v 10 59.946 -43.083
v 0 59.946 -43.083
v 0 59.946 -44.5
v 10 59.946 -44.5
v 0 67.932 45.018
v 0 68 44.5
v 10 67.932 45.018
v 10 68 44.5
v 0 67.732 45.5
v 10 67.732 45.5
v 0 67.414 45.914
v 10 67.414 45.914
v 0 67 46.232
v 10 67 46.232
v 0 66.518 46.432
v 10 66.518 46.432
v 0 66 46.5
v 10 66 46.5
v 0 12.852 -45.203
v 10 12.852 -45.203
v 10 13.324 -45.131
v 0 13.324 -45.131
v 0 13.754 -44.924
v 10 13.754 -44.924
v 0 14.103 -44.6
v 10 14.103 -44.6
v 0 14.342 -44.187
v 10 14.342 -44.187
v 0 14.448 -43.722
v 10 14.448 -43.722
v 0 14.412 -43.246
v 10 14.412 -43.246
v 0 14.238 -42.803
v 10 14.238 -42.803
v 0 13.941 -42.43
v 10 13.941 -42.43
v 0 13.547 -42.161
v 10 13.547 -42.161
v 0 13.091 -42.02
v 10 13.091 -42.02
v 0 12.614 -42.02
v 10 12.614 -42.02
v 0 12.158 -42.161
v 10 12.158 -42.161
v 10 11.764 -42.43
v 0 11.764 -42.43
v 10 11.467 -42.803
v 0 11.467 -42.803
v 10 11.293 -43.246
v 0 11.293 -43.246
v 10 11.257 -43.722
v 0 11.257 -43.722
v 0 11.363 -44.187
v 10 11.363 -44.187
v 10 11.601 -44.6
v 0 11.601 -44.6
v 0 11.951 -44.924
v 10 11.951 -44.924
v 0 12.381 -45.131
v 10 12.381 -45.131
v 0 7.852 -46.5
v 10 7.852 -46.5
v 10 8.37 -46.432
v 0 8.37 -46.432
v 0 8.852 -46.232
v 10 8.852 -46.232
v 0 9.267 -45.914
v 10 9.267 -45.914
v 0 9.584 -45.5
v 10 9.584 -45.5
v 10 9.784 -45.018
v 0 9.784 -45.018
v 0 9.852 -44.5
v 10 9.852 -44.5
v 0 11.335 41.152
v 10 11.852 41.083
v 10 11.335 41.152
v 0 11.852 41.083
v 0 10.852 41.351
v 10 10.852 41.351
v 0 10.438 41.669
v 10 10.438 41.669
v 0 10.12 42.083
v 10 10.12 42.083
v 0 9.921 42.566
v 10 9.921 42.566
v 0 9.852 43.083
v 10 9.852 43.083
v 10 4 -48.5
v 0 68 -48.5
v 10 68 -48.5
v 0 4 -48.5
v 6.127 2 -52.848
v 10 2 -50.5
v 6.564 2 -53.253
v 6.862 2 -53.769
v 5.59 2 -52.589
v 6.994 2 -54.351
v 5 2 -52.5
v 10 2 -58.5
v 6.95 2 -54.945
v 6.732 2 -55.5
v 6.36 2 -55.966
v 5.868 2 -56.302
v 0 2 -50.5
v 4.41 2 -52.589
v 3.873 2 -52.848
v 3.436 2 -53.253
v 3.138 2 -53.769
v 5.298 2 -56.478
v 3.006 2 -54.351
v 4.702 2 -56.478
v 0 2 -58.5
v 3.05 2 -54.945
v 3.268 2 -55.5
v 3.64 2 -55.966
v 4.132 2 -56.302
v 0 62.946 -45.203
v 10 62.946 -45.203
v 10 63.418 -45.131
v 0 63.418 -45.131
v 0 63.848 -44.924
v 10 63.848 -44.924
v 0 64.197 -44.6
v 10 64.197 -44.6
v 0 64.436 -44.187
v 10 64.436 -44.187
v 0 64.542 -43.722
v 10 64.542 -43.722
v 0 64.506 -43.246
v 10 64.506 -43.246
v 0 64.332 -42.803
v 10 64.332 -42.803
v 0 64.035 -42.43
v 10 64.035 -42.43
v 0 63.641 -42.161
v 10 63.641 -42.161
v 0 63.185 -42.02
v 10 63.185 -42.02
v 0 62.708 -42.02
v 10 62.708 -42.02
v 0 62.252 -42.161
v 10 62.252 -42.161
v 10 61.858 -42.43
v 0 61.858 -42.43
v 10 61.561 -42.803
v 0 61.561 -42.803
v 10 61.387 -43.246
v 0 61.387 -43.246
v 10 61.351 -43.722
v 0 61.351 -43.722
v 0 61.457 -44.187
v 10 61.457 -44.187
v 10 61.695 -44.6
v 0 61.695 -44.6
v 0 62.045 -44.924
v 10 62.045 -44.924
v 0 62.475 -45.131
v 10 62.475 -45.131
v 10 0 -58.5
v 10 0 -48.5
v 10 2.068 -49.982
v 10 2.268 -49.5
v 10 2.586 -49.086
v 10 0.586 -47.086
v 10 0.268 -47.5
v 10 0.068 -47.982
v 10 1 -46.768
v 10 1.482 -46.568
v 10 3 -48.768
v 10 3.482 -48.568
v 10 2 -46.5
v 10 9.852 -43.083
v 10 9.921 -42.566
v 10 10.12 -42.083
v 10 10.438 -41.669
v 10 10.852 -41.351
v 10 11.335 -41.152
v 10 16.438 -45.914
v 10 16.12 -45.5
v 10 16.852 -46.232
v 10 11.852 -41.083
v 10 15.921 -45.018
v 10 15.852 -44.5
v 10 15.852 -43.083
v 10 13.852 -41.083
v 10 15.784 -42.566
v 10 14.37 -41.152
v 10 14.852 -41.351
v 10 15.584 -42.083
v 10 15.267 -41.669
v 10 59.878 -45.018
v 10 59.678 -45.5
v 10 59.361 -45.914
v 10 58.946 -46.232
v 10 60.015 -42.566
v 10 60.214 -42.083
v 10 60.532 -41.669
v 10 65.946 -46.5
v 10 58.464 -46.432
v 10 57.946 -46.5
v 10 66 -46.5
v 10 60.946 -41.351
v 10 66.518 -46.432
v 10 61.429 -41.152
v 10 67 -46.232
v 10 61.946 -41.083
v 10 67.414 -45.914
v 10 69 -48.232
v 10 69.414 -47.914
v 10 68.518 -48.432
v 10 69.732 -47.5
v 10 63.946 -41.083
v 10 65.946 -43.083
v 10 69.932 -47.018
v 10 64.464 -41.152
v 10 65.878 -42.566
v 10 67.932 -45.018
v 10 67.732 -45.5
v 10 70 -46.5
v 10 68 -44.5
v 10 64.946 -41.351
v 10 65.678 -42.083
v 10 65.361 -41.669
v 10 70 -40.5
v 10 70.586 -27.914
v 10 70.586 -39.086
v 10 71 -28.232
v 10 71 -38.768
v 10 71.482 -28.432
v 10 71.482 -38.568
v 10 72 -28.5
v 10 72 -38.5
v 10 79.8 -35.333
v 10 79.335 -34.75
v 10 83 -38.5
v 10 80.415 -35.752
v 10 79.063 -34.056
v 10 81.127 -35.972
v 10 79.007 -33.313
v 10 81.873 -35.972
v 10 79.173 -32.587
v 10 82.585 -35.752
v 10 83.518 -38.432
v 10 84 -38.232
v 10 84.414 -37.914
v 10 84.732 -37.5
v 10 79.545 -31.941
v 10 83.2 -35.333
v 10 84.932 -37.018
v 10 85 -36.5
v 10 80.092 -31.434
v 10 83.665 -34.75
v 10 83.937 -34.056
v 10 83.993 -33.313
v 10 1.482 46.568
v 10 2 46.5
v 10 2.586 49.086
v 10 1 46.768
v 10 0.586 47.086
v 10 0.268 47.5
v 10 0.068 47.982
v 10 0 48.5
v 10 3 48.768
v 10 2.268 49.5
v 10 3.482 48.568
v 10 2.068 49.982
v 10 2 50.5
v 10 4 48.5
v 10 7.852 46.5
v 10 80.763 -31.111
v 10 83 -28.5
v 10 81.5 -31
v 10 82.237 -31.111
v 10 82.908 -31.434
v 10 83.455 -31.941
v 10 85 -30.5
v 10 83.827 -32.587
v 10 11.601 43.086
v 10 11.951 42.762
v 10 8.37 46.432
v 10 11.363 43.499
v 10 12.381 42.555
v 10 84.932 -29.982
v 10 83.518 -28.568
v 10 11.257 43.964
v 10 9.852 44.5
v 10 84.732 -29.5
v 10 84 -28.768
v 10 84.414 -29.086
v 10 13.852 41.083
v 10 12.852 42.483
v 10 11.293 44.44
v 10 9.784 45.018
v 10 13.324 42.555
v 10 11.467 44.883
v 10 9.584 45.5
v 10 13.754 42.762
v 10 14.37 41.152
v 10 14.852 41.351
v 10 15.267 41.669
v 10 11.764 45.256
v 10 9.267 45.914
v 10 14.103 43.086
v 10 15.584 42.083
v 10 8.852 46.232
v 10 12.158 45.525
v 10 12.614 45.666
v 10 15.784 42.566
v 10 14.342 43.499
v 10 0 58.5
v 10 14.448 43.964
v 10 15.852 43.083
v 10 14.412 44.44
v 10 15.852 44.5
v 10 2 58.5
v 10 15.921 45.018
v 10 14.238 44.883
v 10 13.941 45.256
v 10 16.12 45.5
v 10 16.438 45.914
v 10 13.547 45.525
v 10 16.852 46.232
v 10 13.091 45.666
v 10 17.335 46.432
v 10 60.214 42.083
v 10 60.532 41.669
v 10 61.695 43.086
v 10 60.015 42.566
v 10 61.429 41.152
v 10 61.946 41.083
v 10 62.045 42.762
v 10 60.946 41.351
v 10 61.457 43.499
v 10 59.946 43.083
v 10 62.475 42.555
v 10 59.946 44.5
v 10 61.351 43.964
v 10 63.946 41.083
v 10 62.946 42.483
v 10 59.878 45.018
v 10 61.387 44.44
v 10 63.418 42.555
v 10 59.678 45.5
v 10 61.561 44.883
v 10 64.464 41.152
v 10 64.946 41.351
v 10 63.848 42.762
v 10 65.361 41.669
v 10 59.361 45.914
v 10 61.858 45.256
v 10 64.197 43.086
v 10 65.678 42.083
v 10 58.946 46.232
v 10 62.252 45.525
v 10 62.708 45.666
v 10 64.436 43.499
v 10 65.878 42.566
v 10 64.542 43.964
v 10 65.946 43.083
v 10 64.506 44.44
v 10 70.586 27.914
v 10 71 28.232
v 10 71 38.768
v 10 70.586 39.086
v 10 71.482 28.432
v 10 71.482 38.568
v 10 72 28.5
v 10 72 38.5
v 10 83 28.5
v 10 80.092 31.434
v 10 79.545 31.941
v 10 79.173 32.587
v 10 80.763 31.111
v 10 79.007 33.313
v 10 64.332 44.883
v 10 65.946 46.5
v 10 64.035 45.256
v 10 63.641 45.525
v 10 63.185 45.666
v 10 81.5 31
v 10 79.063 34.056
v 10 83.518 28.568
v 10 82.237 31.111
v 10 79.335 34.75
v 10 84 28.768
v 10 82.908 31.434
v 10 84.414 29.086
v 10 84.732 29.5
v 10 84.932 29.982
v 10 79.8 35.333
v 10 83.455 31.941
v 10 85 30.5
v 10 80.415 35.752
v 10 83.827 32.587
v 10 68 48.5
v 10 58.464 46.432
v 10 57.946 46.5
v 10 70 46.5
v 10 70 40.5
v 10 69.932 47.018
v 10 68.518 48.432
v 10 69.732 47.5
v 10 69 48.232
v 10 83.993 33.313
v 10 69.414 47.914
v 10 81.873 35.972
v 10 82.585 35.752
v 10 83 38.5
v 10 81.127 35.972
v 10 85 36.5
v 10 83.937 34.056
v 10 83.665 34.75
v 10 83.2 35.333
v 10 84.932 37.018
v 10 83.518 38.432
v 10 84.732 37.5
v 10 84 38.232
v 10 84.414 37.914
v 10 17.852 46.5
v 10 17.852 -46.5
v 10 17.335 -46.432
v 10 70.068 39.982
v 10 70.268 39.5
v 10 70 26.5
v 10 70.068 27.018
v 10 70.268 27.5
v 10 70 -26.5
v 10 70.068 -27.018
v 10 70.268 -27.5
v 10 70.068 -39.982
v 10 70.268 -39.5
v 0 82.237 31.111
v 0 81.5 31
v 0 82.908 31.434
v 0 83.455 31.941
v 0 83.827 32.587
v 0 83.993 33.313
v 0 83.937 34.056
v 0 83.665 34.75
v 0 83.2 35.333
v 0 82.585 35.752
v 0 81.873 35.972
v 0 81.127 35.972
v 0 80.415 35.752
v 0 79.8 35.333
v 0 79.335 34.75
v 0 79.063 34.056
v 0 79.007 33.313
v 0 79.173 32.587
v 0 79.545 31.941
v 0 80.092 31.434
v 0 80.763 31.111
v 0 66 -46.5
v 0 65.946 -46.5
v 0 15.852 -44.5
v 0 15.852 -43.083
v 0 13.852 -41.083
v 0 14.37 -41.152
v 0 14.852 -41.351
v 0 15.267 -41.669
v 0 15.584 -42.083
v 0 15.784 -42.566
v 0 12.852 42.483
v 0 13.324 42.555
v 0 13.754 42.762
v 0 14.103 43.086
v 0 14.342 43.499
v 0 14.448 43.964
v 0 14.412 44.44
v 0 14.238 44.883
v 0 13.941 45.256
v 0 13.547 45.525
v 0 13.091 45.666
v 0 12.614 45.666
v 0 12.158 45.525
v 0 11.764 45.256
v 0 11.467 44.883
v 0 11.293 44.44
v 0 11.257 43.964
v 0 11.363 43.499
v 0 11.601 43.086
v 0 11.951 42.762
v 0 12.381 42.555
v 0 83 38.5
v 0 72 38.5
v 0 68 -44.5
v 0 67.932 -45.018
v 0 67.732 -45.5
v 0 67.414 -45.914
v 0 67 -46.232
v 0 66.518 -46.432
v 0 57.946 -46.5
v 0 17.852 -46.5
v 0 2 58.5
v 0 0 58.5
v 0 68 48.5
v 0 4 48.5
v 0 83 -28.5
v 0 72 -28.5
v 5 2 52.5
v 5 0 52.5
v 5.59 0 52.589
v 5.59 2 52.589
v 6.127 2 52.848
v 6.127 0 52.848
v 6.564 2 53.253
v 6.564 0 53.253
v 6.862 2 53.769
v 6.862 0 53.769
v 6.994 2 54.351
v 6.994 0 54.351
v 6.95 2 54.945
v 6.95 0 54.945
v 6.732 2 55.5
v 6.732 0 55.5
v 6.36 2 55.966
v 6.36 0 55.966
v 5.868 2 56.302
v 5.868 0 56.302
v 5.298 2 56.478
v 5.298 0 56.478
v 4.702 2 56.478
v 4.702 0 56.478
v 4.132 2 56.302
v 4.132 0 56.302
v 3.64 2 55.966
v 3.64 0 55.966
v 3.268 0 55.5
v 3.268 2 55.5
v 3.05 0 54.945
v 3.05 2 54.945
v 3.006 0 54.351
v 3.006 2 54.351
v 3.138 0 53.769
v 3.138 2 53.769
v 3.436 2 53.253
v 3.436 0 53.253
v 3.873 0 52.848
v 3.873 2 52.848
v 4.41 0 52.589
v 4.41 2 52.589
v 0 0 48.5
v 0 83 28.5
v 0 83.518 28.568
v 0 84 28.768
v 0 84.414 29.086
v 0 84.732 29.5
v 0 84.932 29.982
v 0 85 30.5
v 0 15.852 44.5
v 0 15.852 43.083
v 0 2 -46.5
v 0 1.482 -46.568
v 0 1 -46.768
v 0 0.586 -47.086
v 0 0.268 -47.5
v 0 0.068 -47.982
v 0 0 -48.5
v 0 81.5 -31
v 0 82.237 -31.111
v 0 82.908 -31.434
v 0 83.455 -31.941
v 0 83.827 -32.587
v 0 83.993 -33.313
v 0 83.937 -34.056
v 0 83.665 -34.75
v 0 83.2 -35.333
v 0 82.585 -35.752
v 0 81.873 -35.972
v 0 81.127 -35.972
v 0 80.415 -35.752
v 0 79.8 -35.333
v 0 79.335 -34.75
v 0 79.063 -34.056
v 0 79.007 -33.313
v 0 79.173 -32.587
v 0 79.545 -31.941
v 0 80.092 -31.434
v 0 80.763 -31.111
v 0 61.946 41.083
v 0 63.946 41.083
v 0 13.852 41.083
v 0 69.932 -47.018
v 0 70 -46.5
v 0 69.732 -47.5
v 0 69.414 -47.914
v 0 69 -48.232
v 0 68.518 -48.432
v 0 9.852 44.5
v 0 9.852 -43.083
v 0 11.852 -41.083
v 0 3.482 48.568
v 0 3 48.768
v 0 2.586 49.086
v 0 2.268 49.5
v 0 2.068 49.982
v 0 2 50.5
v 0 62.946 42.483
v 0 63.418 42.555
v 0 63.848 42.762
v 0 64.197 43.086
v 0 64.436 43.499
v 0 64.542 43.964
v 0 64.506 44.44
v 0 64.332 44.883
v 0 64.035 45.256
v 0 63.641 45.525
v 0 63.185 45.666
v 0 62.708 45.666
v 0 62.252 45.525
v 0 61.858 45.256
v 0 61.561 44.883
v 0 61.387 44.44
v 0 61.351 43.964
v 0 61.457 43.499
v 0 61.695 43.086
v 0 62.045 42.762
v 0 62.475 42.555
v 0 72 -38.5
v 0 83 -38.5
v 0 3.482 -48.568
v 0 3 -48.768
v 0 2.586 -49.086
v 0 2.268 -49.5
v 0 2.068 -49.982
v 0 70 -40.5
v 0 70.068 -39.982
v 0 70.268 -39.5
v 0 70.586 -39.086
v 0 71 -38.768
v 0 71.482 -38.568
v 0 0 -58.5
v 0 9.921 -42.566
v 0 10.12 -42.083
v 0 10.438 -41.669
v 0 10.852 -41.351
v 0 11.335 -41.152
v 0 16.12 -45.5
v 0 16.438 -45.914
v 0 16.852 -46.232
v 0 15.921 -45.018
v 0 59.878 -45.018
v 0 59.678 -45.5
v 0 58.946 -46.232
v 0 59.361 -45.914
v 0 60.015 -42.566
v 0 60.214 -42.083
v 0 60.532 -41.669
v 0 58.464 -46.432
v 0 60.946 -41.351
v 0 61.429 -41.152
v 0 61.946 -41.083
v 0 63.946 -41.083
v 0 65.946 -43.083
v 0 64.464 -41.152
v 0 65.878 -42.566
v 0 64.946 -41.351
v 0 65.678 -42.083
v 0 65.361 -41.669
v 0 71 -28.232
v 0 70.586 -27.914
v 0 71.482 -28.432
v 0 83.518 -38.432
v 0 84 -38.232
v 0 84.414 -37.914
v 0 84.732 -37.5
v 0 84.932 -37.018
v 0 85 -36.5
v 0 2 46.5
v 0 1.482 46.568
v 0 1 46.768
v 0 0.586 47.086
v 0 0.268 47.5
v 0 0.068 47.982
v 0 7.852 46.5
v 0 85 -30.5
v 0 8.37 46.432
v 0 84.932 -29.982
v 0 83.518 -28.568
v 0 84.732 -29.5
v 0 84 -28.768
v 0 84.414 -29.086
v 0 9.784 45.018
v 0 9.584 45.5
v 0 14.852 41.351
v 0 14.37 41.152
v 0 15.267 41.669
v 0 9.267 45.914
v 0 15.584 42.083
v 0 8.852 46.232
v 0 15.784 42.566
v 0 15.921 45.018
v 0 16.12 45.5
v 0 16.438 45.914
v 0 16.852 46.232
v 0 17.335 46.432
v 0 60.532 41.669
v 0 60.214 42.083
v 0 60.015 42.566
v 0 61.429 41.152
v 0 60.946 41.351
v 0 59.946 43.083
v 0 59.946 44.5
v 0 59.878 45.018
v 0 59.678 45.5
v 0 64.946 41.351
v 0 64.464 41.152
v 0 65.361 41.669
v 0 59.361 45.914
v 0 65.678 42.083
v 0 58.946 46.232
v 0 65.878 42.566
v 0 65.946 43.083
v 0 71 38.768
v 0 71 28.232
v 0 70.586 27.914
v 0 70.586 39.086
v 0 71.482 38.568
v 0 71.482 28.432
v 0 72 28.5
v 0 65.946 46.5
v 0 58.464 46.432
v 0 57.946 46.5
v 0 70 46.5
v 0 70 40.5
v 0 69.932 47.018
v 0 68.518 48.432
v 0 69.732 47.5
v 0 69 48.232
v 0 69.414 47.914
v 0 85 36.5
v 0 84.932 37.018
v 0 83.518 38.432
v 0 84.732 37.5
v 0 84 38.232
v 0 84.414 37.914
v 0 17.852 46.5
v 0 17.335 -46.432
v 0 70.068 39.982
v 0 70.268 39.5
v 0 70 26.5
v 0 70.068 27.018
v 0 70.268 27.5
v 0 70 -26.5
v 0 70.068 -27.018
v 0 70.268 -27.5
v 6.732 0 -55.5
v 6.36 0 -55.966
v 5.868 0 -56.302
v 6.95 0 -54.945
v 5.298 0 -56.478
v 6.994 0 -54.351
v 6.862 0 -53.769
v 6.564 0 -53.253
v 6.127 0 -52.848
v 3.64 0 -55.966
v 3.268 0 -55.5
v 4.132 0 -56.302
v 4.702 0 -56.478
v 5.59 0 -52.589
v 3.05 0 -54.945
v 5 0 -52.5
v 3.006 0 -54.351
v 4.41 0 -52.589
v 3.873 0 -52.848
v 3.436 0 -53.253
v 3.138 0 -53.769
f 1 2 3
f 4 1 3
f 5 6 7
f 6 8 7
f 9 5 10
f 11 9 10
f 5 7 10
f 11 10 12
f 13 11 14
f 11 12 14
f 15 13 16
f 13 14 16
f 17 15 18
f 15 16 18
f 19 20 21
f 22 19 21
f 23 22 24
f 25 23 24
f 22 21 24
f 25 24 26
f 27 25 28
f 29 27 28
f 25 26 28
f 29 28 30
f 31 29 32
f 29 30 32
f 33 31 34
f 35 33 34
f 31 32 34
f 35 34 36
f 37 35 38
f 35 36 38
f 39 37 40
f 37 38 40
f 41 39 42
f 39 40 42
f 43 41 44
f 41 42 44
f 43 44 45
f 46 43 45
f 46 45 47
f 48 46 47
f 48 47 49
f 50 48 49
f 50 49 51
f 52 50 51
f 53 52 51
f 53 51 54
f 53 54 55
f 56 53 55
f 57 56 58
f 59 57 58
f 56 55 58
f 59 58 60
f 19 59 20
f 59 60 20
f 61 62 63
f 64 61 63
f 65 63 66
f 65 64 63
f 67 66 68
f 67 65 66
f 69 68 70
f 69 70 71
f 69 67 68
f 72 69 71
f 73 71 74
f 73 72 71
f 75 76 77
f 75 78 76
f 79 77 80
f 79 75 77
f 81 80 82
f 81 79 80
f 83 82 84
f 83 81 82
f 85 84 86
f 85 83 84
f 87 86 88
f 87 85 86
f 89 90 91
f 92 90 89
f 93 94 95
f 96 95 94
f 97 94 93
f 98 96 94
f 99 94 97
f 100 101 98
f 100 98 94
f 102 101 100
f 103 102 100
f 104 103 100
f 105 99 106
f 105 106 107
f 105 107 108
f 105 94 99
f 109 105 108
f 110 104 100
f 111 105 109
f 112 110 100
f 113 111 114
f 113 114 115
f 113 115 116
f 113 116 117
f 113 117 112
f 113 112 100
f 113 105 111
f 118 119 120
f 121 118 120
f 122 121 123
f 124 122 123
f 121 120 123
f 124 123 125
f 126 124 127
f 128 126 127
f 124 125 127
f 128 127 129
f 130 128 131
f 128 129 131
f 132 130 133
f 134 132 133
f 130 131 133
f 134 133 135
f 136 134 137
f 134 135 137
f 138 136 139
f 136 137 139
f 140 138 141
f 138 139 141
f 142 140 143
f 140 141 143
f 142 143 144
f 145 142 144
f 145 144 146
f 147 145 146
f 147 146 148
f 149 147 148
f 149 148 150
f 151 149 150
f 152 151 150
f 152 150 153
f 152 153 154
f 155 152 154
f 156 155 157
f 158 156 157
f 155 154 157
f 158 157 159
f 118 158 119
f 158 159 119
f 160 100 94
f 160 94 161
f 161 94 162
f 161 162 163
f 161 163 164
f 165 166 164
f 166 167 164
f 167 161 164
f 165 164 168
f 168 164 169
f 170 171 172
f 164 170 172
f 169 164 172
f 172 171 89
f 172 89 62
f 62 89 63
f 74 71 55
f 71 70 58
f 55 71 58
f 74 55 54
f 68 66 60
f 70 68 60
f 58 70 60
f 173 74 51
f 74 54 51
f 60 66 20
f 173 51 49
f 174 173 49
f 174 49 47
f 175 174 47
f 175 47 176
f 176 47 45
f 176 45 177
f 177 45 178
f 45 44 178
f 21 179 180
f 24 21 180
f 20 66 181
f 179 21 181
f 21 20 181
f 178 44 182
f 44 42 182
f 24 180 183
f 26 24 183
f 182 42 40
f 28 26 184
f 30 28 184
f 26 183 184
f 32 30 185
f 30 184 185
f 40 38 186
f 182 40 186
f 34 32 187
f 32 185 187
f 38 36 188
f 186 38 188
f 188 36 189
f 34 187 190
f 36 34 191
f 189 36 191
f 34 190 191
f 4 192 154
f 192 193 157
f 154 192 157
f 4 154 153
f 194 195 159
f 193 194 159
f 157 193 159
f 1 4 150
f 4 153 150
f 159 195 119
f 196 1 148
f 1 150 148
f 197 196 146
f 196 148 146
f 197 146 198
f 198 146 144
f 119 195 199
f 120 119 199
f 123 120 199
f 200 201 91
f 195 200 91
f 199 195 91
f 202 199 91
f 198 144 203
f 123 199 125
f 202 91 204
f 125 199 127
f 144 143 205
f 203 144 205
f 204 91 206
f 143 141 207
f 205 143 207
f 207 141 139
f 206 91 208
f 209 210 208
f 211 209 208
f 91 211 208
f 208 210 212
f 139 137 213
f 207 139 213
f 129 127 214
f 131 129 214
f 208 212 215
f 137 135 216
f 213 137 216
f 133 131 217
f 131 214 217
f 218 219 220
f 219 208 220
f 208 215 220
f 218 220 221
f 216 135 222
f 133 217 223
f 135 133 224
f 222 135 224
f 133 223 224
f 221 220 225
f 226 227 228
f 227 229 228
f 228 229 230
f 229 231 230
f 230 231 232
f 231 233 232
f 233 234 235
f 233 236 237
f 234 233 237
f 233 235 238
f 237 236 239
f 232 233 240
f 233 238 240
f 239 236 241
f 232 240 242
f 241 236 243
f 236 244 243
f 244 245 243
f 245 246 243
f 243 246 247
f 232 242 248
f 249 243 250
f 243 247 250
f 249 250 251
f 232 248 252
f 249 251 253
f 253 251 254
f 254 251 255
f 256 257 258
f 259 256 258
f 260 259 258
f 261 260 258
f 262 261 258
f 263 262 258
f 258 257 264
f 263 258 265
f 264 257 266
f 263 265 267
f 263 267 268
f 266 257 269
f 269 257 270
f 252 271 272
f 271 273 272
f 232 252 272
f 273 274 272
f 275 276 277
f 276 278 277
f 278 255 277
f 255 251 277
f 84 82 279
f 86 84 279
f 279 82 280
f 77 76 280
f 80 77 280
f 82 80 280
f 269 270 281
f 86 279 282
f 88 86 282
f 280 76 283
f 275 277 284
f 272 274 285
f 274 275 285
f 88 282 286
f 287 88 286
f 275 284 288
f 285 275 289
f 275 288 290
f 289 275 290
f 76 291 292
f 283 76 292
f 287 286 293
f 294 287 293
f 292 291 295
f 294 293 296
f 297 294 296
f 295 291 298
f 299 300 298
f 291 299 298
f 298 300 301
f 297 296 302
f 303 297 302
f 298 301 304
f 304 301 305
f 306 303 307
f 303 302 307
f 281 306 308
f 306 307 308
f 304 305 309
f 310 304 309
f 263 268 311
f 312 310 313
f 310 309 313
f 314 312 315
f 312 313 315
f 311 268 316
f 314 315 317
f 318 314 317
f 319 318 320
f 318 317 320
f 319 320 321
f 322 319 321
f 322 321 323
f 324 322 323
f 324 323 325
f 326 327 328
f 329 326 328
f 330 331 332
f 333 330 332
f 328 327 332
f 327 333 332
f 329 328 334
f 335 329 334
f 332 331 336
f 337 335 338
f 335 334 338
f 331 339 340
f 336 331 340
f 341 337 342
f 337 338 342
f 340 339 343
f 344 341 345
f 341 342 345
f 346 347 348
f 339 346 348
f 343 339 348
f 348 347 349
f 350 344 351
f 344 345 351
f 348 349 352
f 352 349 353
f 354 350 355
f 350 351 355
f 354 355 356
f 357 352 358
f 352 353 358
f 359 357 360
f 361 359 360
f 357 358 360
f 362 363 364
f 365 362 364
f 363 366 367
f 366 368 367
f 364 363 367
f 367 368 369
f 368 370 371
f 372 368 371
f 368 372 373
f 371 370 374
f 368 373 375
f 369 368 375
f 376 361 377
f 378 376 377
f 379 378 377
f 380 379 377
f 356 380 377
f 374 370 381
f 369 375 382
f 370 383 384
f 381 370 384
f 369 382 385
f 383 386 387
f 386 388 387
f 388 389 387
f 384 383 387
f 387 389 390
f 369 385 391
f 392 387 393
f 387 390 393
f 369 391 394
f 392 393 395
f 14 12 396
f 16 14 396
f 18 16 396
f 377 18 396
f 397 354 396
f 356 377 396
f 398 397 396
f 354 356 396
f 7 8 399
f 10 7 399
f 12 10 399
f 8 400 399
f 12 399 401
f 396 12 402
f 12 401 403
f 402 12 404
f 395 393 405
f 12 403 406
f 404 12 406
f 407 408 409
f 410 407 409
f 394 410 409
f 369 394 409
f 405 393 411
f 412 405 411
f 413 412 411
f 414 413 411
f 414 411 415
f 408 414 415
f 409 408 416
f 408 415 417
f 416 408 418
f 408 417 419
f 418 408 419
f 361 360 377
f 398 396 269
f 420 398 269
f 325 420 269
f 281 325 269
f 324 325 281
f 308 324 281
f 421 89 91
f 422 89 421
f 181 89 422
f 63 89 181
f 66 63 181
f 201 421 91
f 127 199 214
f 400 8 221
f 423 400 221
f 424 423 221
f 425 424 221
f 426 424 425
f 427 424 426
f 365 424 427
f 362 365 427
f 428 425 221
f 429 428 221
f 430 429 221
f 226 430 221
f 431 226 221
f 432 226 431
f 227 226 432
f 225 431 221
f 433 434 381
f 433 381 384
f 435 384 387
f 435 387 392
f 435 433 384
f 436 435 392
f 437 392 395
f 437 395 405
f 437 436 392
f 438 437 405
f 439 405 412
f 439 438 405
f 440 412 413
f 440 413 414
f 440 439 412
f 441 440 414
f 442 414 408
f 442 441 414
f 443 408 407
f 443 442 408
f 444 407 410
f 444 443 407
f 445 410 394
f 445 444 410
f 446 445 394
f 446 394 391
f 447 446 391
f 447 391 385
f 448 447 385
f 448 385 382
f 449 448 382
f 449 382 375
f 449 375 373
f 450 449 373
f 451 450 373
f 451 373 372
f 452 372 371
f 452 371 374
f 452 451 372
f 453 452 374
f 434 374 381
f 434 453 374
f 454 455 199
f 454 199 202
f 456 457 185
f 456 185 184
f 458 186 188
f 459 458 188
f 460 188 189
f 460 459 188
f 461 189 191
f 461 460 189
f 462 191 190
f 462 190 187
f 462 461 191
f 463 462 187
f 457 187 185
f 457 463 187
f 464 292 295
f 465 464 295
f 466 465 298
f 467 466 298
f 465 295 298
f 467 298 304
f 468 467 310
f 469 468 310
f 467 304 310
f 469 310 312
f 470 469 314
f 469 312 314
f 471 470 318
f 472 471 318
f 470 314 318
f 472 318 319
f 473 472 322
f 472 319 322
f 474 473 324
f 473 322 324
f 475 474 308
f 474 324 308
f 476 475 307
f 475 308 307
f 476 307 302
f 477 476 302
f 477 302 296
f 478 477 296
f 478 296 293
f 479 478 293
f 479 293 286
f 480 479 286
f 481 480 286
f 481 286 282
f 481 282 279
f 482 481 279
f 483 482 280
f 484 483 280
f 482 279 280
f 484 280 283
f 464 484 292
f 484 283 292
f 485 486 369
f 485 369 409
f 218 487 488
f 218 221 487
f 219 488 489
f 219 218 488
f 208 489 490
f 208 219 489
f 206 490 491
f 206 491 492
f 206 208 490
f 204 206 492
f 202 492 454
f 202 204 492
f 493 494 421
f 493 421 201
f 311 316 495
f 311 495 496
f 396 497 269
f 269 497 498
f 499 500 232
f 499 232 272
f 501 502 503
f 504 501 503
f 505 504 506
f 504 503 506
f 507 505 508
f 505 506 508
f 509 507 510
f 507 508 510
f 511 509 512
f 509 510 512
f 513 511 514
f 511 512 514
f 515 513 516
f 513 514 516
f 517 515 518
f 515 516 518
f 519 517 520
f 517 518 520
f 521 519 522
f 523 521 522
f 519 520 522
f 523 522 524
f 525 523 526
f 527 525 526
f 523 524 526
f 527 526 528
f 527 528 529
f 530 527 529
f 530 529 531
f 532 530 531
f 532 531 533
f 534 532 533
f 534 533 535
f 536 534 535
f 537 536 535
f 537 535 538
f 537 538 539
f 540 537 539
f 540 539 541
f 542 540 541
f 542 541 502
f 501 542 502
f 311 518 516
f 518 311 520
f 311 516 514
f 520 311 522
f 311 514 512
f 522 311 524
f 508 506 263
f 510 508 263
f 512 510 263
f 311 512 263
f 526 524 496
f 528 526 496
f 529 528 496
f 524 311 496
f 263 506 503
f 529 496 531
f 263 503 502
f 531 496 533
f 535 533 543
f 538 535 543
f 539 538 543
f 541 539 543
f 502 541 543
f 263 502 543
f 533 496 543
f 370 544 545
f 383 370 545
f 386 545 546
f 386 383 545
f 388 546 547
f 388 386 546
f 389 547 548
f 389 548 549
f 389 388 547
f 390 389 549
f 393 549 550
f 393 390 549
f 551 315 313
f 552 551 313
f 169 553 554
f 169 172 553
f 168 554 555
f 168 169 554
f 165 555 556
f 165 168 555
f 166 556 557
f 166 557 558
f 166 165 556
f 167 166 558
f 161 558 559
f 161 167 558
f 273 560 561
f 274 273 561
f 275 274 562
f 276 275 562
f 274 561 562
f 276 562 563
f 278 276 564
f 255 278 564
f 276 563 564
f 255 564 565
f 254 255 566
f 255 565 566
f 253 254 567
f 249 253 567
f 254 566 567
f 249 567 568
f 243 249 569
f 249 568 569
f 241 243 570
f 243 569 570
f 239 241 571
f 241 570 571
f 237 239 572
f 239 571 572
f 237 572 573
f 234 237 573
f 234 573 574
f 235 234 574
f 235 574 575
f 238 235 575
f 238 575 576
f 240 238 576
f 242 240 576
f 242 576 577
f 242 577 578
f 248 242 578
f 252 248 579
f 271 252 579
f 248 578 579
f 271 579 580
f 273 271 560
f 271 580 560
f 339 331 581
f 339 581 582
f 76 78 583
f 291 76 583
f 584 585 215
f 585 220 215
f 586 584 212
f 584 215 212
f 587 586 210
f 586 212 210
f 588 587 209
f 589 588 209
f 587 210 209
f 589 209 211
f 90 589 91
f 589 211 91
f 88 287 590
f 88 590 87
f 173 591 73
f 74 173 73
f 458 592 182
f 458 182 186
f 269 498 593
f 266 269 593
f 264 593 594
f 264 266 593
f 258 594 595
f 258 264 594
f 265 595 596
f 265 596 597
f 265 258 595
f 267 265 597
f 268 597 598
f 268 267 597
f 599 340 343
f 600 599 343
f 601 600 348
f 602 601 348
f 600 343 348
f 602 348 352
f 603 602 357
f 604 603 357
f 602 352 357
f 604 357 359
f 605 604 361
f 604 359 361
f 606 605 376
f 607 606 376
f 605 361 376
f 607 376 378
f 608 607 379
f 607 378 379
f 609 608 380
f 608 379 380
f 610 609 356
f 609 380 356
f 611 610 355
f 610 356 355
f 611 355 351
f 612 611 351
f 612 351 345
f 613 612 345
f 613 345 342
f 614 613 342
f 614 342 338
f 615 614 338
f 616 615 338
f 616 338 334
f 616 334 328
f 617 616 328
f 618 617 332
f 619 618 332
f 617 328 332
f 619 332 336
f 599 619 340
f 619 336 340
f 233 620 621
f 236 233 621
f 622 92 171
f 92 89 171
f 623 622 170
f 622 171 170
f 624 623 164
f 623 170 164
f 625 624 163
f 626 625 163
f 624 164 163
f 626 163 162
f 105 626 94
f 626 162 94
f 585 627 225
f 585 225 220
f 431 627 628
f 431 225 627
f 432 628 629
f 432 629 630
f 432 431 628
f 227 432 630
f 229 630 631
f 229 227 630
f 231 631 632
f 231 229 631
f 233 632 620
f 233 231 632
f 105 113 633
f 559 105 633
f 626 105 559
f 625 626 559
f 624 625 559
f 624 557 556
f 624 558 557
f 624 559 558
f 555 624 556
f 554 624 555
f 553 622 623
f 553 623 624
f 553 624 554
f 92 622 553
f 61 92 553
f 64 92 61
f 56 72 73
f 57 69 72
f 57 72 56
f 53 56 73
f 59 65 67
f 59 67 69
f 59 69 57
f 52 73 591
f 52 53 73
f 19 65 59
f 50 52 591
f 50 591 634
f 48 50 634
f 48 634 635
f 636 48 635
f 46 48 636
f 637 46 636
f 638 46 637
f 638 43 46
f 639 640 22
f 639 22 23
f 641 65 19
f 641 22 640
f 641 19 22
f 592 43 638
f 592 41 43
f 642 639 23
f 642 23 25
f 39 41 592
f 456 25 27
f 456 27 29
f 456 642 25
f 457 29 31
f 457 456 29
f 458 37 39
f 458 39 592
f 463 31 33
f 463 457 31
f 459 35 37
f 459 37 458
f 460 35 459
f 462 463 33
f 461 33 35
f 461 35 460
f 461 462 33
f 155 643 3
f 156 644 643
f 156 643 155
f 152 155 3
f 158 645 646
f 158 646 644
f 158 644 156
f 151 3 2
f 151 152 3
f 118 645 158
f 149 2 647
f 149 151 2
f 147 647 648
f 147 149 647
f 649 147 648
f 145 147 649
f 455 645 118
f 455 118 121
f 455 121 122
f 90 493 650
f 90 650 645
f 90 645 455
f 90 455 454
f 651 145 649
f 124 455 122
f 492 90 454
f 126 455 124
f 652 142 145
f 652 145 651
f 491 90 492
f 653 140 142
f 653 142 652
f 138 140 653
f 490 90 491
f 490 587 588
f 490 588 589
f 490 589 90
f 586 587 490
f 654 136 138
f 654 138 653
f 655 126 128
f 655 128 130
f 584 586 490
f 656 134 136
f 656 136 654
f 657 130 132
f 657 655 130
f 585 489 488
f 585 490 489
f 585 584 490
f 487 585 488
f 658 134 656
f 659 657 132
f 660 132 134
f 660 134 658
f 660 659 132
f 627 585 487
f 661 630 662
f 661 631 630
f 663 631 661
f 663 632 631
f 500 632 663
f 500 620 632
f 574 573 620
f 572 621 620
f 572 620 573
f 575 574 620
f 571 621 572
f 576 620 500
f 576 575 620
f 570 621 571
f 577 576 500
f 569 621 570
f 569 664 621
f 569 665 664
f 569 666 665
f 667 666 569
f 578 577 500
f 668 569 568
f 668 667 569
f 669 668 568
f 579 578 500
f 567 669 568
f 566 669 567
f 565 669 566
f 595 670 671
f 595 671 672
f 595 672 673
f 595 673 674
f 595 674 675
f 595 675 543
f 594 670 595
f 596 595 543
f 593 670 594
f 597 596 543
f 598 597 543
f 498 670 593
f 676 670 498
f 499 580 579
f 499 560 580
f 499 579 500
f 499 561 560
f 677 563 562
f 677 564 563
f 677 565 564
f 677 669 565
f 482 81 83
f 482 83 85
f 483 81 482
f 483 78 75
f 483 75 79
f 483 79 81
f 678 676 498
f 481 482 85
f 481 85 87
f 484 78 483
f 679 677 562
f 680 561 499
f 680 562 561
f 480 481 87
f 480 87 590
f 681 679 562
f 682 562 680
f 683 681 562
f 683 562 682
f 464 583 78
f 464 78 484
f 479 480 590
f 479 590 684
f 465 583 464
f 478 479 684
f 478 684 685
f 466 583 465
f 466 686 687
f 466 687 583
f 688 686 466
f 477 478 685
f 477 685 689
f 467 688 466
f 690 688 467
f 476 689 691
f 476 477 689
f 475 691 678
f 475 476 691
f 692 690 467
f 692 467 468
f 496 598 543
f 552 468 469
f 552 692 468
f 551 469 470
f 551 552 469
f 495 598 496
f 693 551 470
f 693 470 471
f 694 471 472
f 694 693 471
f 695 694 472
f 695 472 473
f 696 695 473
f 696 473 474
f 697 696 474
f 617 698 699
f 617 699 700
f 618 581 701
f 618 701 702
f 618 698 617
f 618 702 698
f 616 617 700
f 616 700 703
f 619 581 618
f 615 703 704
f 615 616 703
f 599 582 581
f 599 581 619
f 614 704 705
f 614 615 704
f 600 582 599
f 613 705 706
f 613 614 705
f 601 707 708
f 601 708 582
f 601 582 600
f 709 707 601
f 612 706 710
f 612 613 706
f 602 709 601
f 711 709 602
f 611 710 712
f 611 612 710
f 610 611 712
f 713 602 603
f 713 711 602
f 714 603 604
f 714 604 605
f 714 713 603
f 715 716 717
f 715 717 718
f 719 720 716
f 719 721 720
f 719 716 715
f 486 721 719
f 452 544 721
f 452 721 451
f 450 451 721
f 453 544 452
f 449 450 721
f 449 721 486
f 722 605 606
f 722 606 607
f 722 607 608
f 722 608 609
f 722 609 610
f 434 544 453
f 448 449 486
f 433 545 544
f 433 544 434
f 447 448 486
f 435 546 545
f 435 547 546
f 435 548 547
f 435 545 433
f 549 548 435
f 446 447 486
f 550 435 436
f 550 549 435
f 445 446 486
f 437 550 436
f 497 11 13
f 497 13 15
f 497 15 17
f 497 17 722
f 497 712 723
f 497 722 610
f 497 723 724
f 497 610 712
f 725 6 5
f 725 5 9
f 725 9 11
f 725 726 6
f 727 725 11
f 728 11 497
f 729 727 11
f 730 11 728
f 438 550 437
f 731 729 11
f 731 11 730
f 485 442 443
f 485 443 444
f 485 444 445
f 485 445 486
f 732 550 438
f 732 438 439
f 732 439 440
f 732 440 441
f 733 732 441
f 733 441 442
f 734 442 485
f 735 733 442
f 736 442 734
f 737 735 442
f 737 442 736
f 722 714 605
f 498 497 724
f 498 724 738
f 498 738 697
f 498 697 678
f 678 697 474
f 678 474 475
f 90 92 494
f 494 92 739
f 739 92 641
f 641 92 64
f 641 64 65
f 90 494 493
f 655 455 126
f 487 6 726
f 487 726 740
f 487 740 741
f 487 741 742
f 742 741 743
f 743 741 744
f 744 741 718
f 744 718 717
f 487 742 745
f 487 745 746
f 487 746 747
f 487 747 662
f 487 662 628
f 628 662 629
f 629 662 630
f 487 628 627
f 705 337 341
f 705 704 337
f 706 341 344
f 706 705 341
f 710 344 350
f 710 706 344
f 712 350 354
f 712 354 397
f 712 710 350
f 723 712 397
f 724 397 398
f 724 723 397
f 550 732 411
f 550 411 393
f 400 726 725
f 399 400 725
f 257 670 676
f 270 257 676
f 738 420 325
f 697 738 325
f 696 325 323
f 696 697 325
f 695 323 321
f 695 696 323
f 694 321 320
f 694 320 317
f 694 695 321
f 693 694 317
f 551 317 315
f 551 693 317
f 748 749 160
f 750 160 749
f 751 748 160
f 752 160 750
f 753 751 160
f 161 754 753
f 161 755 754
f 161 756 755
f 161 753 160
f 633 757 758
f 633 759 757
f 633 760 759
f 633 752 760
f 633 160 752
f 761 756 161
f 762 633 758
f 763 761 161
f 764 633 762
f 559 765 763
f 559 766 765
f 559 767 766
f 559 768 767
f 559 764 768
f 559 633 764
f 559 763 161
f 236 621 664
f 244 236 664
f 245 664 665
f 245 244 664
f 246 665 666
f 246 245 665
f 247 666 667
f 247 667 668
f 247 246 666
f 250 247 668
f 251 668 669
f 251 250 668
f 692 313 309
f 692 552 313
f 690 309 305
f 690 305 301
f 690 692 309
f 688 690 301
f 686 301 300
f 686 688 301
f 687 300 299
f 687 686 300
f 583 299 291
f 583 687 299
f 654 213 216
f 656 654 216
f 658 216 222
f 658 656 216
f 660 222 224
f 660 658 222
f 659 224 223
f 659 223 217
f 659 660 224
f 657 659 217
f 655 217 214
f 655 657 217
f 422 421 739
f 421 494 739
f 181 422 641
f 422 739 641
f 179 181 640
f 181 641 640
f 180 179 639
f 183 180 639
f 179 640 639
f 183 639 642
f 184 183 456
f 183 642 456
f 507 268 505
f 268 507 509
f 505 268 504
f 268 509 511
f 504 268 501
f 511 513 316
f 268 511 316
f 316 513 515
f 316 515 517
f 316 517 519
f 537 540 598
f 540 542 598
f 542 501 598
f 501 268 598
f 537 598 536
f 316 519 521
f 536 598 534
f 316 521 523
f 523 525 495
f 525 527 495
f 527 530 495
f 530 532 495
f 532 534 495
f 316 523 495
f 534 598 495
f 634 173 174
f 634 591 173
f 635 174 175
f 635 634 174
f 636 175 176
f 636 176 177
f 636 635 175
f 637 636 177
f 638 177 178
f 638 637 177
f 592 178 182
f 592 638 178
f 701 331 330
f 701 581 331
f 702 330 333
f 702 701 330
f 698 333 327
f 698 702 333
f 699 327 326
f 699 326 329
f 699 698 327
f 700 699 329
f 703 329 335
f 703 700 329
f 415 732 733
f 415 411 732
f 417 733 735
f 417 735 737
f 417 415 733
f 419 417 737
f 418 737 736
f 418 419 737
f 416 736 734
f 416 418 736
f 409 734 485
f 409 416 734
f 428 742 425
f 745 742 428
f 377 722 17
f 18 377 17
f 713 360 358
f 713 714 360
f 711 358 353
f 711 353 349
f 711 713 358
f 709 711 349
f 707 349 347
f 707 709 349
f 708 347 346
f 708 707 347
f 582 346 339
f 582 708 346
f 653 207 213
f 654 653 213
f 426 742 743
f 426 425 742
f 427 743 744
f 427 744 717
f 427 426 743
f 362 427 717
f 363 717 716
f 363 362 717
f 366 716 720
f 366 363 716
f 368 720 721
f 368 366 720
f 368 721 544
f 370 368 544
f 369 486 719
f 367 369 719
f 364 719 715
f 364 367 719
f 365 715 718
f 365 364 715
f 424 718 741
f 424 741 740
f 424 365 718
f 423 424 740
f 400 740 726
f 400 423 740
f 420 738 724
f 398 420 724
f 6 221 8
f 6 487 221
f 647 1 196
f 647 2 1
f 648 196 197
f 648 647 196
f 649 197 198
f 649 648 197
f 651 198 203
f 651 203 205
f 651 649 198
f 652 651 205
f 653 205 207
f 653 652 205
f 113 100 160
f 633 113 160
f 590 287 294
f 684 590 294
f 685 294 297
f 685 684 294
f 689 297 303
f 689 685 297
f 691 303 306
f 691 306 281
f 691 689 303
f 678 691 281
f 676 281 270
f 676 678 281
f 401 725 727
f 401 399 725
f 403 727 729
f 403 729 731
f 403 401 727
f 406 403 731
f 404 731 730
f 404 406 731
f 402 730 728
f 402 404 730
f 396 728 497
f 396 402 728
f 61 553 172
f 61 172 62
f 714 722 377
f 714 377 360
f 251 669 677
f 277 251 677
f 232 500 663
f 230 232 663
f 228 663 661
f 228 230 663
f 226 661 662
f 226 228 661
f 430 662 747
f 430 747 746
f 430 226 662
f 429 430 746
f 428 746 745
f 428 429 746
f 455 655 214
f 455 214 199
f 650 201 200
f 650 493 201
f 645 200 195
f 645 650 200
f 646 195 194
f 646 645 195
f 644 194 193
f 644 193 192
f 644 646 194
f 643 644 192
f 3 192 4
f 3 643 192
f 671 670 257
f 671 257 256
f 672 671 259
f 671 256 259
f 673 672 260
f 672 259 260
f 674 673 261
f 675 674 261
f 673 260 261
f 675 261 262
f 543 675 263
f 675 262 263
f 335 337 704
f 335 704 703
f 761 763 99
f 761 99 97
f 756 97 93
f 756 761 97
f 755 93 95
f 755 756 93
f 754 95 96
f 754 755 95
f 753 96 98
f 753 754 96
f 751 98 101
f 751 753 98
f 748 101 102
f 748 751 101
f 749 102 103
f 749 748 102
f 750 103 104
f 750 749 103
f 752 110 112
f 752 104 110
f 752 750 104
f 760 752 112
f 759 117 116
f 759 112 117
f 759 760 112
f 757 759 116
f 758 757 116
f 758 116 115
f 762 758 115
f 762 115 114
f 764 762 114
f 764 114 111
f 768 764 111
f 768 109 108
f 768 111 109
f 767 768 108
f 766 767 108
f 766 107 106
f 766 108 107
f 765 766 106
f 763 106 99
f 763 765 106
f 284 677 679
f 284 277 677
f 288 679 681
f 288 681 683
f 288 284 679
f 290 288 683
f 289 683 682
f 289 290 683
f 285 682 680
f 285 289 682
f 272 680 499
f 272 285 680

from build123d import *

# Parameters (mm, degrees)
SKETCH1_W             = 10
SKETCH1_H             = 15
SKETCH1_R             = 2.5
BOSS_EXTRUDE1_DEPTH   = 10
FILLET1_R             = 2
F_4_0MM_DOWEL_HOLE1_D = 4
SKETCH4_W             = 5.416503596
SKETCH4_H             = 6
SKETCH4_R             = 1.6
BOSS_EXTRUDE2_DEPTH   = 10
FILLET1_OF_MIRROR1_R  = 2
SKETCH5_W             = 5.416503596
SKETCH5_H             = 6
SKETCH5_R             = 1.6
BOSS_EXTRUDE3_DEPTH   = 10
FILLET2_R             = 2


with BuildPart() as part:
    # Sketch1 → Boss-Extrude1 (new body)
    # profile 1 of 2: a face of its own
    with BuildSketch(Plane(origin=(0, 0, 0), x_dir=(0, 0, -1), z_dir=(1, 0, 0))):
        with Locations((-33.5, 77.5)):
            Rectangle(SKETCH1_W, SKETCH1_H)
        with Locations((-33.5, 81.5)):
            Circle(SKETCH1_R, mode=Mode.SUBTRACT)
    # profile 2 of 2: a face of its own
    with BuildSketch(Plane(origin=(0, 0, 0), x_dir=(0, 0, -1), z_dir=(1, 0, 0))):
        Polygon((-46.5, 68), (0, 68), (0, 70), (-48.5, 70), (-48.5, 2), (-58.5, 2), (-58.5, 0), (-46.5, 0), align=None)
    boss_extrude1 = extrude(amount=BOSS_EXTRUDE1_DEPTH)

    # Fillet1
    fillet1_edges = [part.edges().sort_by_distance(p)[0] for p in [
        (5, 68, 46.5),
        (5, 2, 48.5),
        (5, 70, 48.5),
    ]]
    fillet(fillet1_edges, radius=FILLET1_R)

    # Ø4.0mm Dowel Hole1 (through all)
    with Locations(Plane(origin=(5, 2, 54.5), x_dir=(0, 0, 1), z_dir=(0, 1, 0))):
        with Locations((0, 0)):
            f_4_0mm_dowel_hole1 = Hole(F_4_0MM_DOWEL_HOLE1_D / 2)

    # Sketch4 → Boss-Extrude2 (add)
    # profile 1 of 2: a face of its own
    with BuildSketch(Plane(origin=(10, 0, 0), x_dir=(0, 0, -1), z_dir=(1, 0, 0))):
        with Locations((-43.791748202, 62.946385234)):
            Rectangle(SKETCH4_W, SKETCH4_H)
        with Locations((-44.083496404, 62.946385234)):
            Circle(SKETCH4_R, mode=Mode.SUBTRACT)
    # profile 2 of 2: a face of its own
    with BuildSketch(Plane(origin=(10, 0, 0), x_dir=(0, 0, -1), z_dir=(1, 0, 0))):
        with Locations((-43.791748202, 12.852385234)):
            Rectangle(SKETCH4_W, SKETCH4_H)
        with Locations((-44.083496404, 12.852385234)):
            Circle(SKETCH4_R, mode=Mode.SUBTRACT)
    extrude(amount=-BOSS_EXTRUDE2_DEPTH)

    # Mirror1: Boss-Extrude1, Ø4.0mm Dowel Hole1 across plane
    add(boss_extrude1.mirror(Plane.XY))
    add(f_4_0mm_dowel_hole1.mirror(Plane.XY), mode=Mode.SUBTRACT)

    # Fillet1 of Mirror1
    fillet1_of_mirror1_edges = [part.edges().sort_by_distance(p)[0] for p in [
        (5, 68, -46.5),
        (5, 2, -48.5),
        (5, 70, -48.5),
    ]]
    fillet(fillet1_of_mirror1_edges, radius=FILLET1_OF_MIRROR1_R)

    # Sketch5 → Boss-Extrude3 (add)
    # profile 1 of 2: a face of its own
    with BuildSketch(Plane(origin=(10, 0, 0), x_dir=(0, 0, -1), z_dir=(1, 0, 0))):
        with Locations((43.791748202, 62.946385234)):
            Rectangle(SKETCH5_W, SKETCH5_H)
        with Locations((43.602503596, 62.946385234)):
            Circle(SKETCH5_R, mode=Mode.SUBTRACT)
    # profile 2 of 2: a face of its own
    with BuildSketch(Plane(origin=(10, 0, 0), x_dir=(0, 0, -1), z_dir=(1, 0, 0))):
        with Locations((43.791748202, 12.852385234)):
            Rectangle(SKETCH5_W, SKETCH5_H)
        with Locations((43.602503596, 12.852385234)):
            Circle(SKETCH5_R, mode=Mode.SUBTRACT)
    extrude(amount=-BOSS_EXTRUDE3_DEPTH)

    # Fillet2
    fillet2_edges = [part.edges().sort_by_distance(p)[0] for p in [
        (5, 70, -38.5),
        (5, 85, -38.5),
        (5, 85, -28.5),
        (5, 70, -28.5),
        (5, 0, -46.5),
        (5, 65.946385234, -41.083496404),
        (5, 59.946385234, -41.083496404),
        (5, 59.946385234, -46.5),
        (5, 15.852385234, -46.5),
        (5, 15.852385234, -41.083496404),
        (5, 9.852385234, -41.083496404),
        (5, 9.852385234, -46.5),
        (5, 85, 38.5),
        (5, 85, 28.5),
        (5, 70, 28.5),
        (5, 0, 46.5),
        (5, 70, 38.5),
        (5, 65.946385234, 41.083496404),
        (5, 59.946385234, 41.083496404),
        (5, 59.946385234, 46.5),
        (5, 15.852385234, 41.083496404),
        (5, 15.852385234, 46.5),
        (5, 9.852385234, 46.5),
        (5, 9.852385234, 41.083496404),
    ]]
    fillet(fillet2_edges, radius=FILLET2_R)


solid = part.part
